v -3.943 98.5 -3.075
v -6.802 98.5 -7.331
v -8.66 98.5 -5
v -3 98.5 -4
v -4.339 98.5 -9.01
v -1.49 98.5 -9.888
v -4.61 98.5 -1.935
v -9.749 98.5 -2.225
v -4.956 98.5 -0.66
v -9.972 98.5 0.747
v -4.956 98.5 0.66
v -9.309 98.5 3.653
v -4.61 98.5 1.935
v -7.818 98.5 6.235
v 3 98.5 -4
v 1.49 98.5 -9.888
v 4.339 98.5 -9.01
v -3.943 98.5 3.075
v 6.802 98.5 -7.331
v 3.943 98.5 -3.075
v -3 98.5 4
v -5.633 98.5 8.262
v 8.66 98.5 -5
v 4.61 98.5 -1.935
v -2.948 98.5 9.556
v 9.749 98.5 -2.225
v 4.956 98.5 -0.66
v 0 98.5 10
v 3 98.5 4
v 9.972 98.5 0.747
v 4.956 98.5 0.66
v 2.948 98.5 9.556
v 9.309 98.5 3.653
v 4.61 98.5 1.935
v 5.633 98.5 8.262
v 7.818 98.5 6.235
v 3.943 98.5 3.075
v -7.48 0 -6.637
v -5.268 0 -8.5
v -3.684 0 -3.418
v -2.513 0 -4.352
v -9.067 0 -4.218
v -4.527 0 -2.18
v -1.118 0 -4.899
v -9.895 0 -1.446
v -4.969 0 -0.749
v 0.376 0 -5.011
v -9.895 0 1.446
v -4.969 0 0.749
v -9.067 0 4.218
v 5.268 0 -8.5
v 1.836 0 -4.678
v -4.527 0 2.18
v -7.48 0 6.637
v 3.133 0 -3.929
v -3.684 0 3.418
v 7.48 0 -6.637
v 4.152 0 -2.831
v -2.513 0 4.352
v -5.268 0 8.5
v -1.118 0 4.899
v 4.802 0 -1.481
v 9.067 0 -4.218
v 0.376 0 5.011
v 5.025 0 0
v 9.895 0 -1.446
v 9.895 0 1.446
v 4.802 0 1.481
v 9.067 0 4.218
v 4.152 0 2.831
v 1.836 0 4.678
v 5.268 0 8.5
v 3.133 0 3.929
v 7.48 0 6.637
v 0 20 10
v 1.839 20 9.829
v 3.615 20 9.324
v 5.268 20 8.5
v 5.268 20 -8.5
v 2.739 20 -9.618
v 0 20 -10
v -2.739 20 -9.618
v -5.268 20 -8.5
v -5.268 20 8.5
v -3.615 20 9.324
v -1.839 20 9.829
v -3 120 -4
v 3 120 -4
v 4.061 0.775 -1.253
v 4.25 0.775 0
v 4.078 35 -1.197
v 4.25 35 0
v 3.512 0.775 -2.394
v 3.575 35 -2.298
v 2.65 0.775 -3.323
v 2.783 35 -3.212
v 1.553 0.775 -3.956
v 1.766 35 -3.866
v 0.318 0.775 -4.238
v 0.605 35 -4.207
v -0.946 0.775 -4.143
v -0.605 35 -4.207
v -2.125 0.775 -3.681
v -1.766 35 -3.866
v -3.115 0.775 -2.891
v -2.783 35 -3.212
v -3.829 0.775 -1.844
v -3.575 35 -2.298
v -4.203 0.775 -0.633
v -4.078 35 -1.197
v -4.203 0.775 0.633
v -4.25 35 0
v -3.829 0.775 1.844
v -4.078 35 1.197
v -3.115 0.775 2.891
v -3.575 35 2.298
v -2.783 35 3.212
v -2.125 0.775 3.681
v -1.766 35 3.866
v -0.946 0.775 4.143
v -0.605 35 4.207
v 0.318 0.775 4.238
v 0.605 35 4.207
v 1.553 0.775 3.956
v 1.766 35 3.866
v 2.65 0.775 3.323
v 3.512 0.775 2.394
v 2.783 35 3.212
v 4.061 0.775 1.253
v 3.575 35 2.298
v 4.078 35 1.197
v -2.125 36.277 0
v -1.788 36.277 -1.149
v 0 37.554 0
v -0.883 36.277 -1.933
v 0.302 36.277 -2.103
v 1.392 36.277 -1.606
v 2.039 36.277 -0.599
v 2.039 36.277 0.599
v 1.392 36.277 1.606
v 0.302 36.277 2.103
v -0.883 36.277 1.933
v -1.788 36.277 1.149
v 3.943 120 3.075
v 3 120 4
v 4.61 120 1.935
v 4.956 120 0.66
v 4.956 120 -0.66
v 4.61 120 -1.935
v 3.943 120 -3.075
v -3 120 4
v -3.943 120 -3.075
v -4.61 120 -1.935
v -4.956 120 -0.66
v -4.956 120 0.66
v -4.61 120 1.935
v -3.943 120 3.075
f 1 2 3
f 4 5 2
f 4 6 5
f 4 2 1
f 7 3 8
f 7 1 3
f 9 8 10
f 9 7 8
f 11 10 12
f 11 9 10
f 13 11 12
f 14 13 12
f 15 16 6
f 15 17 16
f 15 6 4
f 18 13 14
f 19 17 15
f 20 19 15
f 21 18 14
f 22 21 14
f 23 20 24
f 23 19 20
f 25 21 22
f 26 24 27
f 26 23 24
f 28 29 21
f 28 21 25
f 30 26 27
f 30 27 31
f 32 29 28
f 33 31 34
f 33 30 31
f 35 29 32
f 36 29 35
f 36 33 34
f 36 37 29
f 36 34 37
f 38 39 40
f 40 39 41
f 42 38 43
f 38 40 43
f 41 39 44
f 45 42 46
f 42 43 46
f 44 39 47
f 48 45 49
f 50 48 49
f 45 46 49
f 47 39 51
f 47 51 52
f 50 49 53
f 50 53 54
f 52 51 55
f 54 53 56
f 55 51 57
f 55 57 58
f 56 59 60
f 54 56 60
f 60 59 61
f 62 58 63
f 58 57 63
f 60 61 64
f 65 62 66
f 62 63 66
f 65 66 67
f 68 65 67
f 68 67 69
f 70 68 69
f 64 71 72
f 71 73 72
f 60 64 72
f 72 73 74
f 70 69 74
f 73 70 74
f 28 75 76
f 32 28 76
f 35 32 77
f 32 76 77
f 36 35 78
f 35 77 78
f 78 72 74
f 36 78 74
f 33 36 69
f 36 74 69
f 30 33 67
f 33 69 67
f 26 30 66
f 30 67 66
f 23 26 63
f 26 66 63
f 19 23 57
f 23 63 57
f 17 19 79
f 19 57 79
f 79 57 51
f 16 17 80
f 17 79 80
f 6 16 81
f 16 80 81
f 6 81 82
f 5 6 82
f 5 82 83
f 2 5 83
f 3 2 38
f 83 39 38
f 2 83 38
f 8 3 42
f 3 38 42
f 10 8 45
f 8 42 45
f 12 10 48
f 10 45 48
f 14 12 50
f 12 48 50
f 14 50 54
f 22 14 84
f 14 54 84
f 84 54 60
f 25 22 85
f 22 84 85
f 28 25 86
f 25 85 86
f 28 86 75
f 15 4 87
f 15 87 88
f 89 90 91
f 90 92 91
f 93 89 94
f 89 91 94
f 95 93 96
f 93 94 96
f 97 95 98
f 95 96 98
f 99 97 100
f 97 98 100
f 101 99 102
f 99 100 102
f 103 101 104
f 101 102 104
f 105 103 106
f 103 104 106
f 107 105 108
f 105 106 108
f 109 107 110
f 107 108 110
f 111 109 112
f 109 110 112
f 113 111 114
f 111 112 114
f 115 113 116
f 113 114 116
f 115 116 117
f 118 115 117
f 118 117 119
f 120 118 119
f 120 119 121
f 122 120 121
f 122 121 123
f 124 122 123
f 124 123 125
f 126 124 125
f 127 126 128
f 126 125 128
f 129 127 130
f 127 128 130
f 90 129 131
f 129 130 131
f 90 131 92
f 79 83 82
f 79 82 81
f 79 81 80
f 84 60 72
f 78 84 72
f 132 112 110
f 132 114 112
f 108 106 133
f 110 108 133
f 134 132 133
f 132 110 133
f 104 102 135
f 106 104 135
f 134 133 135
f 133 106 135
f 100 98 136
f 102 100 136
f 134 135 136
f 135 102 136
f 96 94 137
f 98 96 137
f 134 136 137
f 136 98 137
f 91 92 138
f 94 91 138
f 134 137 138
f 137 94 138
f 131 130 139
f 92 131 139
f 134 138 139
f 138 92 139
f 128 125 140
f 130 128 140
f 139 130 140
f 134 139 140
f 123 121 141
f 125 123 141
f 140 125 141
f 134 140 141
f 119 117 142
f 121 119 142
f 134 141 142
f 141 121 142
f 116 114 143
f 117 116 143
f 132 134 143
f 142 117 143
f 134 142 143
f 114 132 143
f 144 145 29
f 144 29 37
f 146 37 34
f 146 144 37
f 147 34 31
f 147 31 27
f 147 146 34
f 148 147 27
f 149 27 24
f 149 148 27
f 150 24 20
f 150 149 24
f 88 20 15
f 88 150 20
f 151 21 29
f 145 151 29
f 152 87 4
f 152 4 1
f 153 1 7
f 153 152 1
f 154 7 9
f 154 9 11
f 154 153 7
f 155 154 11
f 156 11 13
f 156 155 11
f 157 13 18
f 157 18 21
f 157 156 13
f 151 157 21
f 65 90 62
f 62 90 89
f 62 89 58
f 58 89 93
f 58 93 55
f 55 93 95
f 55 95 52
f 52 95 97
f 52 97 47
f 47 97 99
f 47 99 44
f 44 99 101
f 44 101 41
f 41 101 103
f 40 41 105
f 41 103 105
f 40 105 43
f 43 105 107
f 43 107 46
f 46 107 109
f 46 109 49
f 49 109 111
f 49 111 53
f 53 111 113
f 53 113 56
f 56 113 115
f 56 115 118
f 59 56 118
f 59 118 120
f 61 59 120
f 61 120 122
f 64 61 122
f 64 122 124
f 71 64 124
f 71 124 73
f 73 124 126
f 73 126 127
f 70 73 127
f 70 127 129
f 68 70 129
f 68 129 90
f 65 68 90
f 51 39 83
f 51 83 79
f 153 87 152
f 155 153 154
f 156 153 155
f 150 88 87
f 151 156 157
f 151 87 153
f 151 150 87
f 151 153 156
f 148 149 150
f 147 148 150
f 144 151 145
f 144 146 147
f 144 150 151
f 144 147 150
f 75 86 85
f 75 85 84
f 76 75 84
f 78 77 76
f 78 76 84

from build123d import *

# Parameters (mm, degrees)
ESQUISSE1_R                  = 10
BOSS_EXTRU_1_DEPTH           = 120
ESQUISSE2_R                  = 10
ESQUISSE2_R_2                = 5
ENL_V_MAT_EXTRU_1_DEPTH      = 21.5
TROU_TARAUD_M101_D           = 8.5
TROU_TARAUD_M101_DEPTH       = 35
TROU_TARAUD_M101_CSINK_D     = 10.05
TROU_TARAUD_M101_CSINK_ANGLE = 90
TROU_TARAUD_M101_TIP         = 2.553657631
ESQUISSE14_W                 = 20
ESQUISSE14_H                 = 1.5
ENL_V_MAT_EXTRU_2_DEPTH      = 20
ESQUISSE15_W                 = 20
ESQUISSE15_H                 = 1
ENL_V_MAT_EXTRU_5_DEPTH      = 21.5


with BuildPart() as part:
    # Esquisse1 → Boss.-Extru.1 (new body)
    with BuildSketch(Plane(origin=(0, 0, 0), x_dir=(1, 0, 0), z_dir=(0, 1, 0))):
        with Locations(Location((0, 0, 0), (0, 0, 270))):  # turned: the seam where the file's is
            Circle(ESQUISSE1_R)
    extrude(amount=BOSS_EXTRU_1_DEPTH)

    # Esquisse2 → Enlèv. mat.-Extru.1 (cut)
    with BuildSketch(Plane(origin=(0, 120, 0), x_dir=(1, 0, 0), z_dir=(0, 1, 0))):
        with Locations(Location((0, 0, 0), (0, 0, 270))):  # turned: the seam where the file's is
            Circle(ESQUISSE2_R)
        with Locations(Location((0, 0, 0), (0, 0, 270))):  # turned: the seam where the file's is
            Circle(ESQUISSE2_R_2, mode=Mode.SUBTRACT)
    extrude(amount=-ENL_V_MAT_EXTRU_1_DEPTH, mode=Mode.SUBTRACT)

    # Trou taraudé M101
    with Locations(Plane(origin=(0, 0, 0), x_dir=(-1, 0, 0), z_dir=(0, -1, 0))):
        with Locations((0, 0)):
            CounterSinkHole(TROU_TARAUD_M101_D / 2, TROU_TARAUD_M101_CSINK_D / 2, depth=TROU_TARAUD_M101_DEPTH, counter_sink_angle=TROU_TARAUD_M101_CSINK_ANGLE)
            with Locations((0, 0, -(TROU_TARAUD_M101_DEPTH + TROU_TARAUD_M101_TIP / 2))):  # 118° drill point
                Cone(0, TROU_TARAUD_M101_D / 2, TROU_TARAUD_M101_TIP, mode=Mode.SUBTRACT)

    # Esquisse14 → Enlèv. mat.-Extru.2 (cut)
    with BuildSketch(Plane.XZ):
        with Locations((0, 9.25)):
            Rectangle(ESQUISSE14_W, ESQUISSE14_H)
        with Locations((0, -9.25)):
            Rectangle(ESQUISSE14_W, ESQUISSE14_H)
    extrude(amount=-ENL_V_MAT_EXTRU_2_DEPTH, mode=Mode.SUBTRACT)

    # Esquisse15 → Enlèv. mat.-Extru.5 (cut)
    with BuildSketch(Plane(origin=(0, 120, 0), x_dir=(1, 0, 0), z_dir=(0, 1, 0))):
        with Locations((0, 4.5)):
            Rectangle(ESQUISSE15_W, ESQUISSE15_H)
        with Locations((0, -4.5)):
            Rectangle(ESQUISSE15_W, ESQUISSE15_H)
    extrude(amount=-ENL_V_MAT_EXTRU_5_DEPTH, mode=Mode.SUBTRACT)


solid = part.part
